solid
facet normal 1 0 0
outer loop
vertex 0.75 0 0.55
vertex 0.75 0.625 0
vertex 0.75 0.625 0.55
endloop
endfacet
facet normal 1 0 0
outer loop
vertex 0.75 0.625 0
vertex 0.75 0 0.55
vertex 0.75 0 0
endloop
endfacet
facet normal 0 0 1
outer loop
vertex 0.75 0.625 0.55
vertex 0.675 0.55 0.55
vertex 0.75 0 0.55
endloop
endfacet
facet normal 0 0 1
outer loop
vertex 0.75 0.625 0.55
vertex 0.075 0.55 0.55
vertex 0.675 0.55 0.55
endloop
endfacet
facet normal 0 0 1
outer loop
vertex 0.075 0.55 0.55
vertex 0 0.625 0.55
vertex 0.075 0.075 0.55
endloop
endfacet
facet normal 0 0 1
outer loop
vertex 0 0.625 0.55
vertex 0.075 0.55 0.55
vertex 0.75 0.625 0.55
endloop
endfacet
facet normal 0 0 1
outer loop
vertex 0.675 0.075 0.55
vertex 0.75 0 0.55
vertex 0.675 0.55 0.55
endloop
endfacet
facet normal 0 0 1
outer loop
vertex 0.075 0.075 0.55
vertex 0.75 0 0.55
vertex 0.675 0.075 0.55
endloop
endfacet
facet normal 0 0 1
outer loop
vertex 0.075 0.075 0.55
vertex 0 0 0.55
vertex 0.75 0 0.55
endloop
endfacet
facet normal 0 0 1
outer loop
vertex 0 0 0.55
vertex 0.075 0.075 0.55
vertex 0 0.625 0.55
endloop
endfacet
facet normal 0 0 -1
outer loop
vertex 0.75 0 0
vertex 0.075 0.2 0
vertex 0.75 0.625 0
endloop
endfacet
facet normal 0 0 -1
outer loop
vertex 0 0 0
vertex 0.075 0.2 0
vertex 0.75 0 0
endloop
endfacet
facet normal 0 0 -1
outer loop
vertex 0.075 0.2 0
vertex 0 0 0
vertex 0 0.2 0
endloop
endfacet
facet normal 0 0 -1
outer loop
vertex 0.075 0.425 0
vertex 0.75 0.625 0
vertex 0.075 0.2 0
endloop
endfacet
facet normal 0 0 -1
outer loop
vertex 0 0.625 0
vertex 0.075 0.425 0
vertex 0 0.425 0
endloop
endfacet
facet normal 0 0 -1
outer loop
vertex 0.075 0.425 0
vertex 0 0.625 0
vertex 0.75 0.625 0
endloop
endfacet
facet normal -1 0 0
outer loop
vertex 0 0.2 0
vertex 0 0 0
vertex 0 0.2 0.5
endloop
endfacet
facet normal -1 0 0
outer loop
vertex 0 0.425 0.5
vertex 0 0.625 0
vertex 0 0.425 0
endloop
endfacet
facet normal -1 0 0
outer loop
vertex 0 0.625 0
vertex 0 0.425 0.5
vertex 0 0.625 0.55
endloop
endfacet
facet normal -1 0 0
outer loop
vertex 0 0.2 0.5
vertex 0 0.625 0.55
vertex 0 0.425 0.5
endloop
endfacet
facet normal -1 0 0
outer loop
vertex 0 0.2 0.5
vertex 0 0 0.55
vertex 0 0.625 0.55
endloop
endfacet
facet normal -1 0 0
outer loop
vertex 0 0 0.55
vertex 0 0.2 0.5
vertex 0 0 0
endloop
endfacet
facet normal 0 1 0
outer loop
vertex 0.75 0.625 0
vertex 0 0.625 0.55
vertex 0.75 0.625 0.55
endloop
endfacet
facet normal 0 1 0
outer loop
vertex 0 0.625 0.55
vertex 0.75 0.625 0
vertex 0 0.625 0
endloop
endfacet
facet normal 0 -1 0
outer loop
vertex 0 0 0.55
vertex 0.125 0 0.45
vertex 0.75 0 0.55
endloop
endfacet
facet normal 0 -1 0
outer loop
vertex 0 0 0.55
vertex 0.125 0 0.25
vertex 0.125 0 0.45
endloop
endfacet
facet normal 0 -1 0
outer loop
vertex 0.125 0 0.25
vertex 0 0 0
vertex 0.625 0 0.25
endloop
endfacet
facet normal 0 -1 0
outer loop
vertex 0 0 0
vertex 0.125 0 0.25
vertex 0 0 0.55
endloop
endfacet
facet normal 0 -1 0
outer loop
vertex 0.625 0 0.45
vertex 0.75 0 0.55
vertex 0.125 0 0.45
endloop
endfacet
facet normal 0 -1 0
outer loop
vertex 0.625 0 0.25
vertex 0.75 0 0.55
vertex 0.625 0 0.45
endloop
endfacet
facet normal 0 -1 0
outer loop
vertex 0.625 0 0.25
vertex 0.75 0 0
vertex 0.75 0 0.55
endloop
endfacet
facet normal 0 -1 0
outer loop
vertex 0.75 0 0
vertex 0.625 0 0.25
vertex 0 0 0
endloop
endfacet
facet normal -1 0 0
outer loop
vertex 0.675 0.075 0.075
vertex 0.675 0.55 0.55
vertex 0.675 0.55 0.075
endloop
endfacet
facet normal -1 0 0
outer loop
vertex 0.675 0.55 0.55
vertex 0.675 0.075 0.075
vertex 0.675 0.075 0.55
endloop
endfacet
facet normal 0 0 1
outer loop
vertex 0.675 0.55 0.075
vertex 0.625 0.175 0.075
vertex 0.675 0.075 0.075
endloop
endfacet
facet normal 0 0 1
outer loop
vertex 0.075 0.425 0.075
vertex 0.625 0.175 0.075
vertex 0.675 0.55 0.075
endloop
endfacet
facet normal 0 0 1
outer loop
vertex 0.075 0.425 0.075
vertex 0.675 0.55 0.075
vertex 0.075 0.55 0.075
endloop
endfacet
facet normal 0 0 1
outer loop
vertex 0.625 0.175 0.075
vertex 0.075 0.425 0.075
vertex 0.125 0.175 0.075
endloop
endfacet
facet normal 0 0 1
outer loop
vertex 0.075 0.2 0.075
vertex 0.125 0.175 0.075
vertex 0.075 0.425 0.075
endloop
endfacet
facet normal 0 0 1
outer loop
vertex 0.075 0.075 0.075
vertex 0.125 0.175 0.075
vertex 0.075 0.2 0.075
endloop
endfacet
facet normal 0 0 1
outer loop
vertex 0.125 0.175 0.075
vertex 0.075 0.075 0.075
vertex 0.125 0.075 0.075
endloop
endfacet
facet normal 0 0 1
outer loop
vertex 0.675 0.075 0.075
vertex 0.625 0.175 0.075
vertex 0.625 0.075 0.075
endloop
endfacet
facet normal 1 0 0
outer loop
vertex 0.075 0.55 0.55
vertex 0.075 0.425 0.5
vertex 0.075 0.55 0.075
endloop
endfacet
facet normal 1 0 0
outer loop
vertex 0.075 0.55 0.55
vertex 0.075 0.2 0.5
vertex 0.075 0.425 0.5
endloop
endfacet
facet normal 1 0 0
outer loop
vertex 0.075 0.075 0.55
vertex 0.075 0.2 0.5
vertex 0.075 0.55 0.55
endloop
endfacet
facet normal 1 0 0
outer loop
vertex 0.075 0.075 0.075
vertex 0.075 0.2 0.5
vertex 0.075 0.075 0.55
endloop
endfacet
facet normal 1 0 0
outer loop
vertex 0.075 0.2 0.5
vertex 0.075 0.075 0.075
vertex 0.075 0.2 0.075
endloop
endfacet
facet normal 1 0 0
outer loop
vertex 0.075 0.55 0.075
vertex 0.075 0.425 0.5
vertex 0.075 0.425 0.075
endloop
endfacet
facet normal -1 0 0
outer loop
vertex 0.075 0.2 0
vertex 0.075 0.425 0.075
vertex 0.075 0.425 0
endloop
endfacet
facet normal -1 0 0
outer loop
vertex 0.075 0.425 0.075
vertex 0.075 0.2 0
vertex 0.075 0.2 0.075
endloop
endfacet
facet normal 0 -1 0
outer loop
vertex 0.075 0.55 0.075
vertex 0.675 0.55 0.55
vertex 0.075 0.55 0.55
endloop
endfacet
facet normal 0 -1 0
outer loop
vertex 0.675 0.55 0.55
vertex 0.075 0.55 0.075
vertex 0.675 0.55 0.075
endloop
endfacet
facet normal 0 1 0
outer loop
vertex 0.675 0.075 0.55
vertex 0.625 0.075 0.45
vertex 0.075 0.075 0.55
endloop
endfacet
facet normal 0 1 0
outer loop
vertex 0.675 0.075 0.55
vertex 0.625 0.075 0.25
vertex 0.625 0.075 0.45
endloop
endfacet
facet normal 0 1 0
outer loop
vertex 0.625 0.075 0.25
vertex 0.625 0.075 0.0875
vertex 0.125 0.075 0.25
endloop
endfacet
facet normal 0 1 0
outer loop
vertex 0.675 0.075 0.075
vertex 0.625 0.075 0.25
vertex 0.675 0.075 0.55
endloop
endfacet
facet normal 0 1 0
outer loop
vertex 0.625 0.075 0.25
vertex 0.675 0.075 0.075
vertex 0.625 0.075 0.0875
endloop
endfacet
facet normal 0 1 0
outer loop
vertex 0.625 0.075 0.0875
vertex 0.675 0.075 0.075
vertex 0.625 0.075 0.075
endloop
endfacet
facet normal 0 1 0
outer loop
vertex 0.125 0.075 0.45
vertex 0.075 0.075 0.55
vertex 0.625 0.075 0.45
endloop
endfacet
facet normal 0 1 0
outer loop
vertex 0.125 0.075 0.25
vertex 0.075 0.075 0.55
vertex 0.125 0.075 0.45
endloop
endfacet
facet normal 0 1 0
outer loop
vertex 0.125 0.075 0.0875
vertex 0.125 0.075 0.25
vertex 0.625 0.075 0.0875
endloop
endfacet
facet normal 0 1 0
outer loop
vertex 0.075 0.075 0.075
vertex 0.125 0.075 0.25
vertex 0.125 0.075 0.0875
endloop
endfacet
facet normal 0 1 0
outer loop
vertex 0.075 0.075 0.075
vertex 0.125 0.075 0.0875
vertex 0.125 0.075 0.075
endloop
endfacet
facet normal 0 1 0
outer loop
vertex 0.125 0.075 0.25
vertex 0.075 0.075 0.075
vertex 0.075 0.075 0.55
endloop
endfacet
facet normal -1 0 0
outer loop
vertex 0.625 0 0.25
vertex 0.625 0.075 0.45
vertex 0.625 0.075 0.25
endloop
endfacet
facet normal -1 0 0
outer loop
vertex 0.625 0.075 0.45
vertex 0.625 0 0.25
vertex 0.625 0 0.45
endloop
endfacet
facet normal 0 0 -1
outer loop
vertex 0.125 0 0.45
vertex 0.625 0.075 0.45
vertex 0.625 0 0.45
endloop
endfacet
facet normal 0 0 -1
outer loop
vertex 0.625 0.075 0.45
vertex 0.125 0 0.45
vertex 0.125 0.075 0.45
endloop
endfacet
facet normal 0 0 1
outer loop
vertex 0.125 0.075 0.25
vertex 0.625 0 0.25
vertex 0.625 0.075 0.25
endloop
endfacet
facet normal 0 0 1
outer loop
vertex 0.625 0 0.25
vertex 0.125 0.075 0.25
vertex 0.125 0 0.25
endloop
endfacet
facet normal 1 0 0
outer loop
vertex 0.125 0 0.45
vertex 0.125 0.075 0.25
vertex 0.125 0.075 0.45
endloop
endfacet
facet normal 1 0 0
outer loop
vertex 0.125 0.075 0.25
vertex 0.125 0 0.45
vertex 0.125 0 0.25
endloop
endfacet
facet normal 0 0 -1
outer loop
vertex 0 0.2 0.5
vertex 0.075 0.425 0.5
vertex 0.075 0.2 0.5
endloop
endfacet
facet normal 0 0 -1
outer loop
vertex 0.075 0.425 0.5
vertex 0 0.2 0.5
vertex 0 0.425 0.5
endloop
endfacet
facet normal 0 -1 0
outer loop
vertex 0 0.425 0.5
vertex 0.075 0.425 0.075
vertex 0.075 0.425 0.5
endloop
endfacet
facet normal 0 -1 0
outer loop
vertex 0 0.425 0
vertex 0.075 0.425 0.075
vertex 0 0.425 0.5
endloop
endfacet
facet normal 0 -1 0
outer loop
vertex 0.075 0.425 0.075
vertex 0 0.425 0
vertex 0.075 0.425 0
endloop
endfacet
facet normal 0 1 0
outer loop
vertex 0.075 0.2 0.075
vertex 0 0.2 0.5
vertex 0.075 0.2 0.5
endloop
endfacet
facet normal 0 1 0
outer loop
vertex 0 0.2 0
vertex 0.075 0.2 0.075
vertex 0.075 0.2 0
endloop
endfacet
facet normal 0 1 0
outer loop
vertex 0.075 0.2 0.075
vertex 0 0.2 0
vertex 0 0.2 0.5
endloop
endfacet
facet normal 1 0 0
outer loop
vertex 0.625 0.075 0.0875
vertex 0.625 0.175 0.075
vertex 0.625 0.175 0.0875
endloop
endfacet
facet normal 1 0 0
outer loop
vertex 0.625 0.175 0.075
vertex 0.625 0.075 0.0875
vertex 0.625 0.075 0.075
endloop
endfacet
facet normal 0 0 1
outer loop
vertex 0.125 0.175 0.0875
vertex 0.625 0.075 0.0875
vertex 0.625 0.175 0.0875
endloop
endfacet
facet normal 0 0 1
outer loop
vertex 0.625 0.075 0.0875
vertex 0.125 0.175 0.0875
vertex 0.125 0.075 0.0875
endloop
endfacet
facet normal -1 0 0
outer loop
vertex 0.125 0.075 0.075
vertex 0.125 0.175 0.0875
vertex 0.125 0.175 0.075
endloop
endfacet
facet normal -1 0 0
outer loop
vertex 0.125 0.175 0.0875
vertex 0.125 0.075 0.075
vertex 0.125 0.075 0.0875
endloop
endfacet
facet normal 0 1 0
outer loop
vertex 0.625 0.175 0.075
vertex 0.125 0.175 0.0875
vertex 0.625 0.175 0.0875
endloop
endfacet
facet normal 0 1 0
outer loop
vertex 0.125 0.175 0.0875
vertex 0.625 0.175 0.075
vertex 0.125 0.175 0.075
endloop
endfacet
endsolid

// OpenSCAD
// Parametric OpenSCAD Model - Rectangular Enclosure with Cuts and Ledge
// All dimensions in inches

// === PARAMETERS ===
// Main body dimensions
outer_width = 0.75;      // X dimension
outer_depth = 0.625;     // Y dimension
outer_height = 0.55;     // Z dimension
wall_thickness = 0.075;  // Wall material thickness

// Front wall cut dimensions
front_cut_length = 0.5;
front_cut_margin = 0.125;
front_cut_z_start = 0.25;
front_cut_z_end = 0.45;
front_cut_depth = 0.075;

// Left side opening dimensions
left_cut_depth = 0.075;
left_cut_y_span = 0.225;
left_cut_y_front_margin = 0.2;
left_cut_z_max = 0.5;

// Internal ledge dimensions
ledge_length = 0.5;
ledge_width = 0.1;
ledge_thickness = 0.0125;
ledge_margin_x = 0.125;

// Resolution
$fn = 100;

// === MODULES ===
// Main hollow enclosure module
module hollow_enclosure() {
    difference() {
        // Outer solid block
        cube([outer_width, outer_depth, outer_height]);
        
        // Inner void (open top hollow)
        translate([wall_thickness, wall_thickness, wall_thickness])
        cube([outer_width - 2*wall_thickness, 
              outer_depth - 2*wall_thickness, 
              outer_height]);
    }
}

// Front horizontal wall cut
module front_wall_cut() {
    // Position: centered on front face (Y=0)
    translate([front_cut_margin, 0, front_cut_z_start])
    cube([front_cut_length, front_cut_depth, 
          front_cut_z_end - front_cut_z_start]);
}

// Left side vertical opening
module left_side_opening() {
    // Position: on left face (X=0)
    translate([0, left_cut_y_front_margin, 0])
    cube([left_cut_depth, left_cut_y_span, left_cut_z_max]);
}

// Internal ledge
module internal_ledge() {
    // Position: inside front wall, above base
    translate([ledge_margin_x, wall_thickness, wall_thickness])
    cube([ledge_length, ledge_width, ledge_thickness]);
}

// === MAIN MODEL ===
difference() {
    // Start with hollow enclosure
    hollow_enclosure();
    
    // Subtract front wall cut
    front_wall_cut();
    
    // Subtract left side opening
    left_side_opening();
}

// Add internal ledge
internal_ledge();
